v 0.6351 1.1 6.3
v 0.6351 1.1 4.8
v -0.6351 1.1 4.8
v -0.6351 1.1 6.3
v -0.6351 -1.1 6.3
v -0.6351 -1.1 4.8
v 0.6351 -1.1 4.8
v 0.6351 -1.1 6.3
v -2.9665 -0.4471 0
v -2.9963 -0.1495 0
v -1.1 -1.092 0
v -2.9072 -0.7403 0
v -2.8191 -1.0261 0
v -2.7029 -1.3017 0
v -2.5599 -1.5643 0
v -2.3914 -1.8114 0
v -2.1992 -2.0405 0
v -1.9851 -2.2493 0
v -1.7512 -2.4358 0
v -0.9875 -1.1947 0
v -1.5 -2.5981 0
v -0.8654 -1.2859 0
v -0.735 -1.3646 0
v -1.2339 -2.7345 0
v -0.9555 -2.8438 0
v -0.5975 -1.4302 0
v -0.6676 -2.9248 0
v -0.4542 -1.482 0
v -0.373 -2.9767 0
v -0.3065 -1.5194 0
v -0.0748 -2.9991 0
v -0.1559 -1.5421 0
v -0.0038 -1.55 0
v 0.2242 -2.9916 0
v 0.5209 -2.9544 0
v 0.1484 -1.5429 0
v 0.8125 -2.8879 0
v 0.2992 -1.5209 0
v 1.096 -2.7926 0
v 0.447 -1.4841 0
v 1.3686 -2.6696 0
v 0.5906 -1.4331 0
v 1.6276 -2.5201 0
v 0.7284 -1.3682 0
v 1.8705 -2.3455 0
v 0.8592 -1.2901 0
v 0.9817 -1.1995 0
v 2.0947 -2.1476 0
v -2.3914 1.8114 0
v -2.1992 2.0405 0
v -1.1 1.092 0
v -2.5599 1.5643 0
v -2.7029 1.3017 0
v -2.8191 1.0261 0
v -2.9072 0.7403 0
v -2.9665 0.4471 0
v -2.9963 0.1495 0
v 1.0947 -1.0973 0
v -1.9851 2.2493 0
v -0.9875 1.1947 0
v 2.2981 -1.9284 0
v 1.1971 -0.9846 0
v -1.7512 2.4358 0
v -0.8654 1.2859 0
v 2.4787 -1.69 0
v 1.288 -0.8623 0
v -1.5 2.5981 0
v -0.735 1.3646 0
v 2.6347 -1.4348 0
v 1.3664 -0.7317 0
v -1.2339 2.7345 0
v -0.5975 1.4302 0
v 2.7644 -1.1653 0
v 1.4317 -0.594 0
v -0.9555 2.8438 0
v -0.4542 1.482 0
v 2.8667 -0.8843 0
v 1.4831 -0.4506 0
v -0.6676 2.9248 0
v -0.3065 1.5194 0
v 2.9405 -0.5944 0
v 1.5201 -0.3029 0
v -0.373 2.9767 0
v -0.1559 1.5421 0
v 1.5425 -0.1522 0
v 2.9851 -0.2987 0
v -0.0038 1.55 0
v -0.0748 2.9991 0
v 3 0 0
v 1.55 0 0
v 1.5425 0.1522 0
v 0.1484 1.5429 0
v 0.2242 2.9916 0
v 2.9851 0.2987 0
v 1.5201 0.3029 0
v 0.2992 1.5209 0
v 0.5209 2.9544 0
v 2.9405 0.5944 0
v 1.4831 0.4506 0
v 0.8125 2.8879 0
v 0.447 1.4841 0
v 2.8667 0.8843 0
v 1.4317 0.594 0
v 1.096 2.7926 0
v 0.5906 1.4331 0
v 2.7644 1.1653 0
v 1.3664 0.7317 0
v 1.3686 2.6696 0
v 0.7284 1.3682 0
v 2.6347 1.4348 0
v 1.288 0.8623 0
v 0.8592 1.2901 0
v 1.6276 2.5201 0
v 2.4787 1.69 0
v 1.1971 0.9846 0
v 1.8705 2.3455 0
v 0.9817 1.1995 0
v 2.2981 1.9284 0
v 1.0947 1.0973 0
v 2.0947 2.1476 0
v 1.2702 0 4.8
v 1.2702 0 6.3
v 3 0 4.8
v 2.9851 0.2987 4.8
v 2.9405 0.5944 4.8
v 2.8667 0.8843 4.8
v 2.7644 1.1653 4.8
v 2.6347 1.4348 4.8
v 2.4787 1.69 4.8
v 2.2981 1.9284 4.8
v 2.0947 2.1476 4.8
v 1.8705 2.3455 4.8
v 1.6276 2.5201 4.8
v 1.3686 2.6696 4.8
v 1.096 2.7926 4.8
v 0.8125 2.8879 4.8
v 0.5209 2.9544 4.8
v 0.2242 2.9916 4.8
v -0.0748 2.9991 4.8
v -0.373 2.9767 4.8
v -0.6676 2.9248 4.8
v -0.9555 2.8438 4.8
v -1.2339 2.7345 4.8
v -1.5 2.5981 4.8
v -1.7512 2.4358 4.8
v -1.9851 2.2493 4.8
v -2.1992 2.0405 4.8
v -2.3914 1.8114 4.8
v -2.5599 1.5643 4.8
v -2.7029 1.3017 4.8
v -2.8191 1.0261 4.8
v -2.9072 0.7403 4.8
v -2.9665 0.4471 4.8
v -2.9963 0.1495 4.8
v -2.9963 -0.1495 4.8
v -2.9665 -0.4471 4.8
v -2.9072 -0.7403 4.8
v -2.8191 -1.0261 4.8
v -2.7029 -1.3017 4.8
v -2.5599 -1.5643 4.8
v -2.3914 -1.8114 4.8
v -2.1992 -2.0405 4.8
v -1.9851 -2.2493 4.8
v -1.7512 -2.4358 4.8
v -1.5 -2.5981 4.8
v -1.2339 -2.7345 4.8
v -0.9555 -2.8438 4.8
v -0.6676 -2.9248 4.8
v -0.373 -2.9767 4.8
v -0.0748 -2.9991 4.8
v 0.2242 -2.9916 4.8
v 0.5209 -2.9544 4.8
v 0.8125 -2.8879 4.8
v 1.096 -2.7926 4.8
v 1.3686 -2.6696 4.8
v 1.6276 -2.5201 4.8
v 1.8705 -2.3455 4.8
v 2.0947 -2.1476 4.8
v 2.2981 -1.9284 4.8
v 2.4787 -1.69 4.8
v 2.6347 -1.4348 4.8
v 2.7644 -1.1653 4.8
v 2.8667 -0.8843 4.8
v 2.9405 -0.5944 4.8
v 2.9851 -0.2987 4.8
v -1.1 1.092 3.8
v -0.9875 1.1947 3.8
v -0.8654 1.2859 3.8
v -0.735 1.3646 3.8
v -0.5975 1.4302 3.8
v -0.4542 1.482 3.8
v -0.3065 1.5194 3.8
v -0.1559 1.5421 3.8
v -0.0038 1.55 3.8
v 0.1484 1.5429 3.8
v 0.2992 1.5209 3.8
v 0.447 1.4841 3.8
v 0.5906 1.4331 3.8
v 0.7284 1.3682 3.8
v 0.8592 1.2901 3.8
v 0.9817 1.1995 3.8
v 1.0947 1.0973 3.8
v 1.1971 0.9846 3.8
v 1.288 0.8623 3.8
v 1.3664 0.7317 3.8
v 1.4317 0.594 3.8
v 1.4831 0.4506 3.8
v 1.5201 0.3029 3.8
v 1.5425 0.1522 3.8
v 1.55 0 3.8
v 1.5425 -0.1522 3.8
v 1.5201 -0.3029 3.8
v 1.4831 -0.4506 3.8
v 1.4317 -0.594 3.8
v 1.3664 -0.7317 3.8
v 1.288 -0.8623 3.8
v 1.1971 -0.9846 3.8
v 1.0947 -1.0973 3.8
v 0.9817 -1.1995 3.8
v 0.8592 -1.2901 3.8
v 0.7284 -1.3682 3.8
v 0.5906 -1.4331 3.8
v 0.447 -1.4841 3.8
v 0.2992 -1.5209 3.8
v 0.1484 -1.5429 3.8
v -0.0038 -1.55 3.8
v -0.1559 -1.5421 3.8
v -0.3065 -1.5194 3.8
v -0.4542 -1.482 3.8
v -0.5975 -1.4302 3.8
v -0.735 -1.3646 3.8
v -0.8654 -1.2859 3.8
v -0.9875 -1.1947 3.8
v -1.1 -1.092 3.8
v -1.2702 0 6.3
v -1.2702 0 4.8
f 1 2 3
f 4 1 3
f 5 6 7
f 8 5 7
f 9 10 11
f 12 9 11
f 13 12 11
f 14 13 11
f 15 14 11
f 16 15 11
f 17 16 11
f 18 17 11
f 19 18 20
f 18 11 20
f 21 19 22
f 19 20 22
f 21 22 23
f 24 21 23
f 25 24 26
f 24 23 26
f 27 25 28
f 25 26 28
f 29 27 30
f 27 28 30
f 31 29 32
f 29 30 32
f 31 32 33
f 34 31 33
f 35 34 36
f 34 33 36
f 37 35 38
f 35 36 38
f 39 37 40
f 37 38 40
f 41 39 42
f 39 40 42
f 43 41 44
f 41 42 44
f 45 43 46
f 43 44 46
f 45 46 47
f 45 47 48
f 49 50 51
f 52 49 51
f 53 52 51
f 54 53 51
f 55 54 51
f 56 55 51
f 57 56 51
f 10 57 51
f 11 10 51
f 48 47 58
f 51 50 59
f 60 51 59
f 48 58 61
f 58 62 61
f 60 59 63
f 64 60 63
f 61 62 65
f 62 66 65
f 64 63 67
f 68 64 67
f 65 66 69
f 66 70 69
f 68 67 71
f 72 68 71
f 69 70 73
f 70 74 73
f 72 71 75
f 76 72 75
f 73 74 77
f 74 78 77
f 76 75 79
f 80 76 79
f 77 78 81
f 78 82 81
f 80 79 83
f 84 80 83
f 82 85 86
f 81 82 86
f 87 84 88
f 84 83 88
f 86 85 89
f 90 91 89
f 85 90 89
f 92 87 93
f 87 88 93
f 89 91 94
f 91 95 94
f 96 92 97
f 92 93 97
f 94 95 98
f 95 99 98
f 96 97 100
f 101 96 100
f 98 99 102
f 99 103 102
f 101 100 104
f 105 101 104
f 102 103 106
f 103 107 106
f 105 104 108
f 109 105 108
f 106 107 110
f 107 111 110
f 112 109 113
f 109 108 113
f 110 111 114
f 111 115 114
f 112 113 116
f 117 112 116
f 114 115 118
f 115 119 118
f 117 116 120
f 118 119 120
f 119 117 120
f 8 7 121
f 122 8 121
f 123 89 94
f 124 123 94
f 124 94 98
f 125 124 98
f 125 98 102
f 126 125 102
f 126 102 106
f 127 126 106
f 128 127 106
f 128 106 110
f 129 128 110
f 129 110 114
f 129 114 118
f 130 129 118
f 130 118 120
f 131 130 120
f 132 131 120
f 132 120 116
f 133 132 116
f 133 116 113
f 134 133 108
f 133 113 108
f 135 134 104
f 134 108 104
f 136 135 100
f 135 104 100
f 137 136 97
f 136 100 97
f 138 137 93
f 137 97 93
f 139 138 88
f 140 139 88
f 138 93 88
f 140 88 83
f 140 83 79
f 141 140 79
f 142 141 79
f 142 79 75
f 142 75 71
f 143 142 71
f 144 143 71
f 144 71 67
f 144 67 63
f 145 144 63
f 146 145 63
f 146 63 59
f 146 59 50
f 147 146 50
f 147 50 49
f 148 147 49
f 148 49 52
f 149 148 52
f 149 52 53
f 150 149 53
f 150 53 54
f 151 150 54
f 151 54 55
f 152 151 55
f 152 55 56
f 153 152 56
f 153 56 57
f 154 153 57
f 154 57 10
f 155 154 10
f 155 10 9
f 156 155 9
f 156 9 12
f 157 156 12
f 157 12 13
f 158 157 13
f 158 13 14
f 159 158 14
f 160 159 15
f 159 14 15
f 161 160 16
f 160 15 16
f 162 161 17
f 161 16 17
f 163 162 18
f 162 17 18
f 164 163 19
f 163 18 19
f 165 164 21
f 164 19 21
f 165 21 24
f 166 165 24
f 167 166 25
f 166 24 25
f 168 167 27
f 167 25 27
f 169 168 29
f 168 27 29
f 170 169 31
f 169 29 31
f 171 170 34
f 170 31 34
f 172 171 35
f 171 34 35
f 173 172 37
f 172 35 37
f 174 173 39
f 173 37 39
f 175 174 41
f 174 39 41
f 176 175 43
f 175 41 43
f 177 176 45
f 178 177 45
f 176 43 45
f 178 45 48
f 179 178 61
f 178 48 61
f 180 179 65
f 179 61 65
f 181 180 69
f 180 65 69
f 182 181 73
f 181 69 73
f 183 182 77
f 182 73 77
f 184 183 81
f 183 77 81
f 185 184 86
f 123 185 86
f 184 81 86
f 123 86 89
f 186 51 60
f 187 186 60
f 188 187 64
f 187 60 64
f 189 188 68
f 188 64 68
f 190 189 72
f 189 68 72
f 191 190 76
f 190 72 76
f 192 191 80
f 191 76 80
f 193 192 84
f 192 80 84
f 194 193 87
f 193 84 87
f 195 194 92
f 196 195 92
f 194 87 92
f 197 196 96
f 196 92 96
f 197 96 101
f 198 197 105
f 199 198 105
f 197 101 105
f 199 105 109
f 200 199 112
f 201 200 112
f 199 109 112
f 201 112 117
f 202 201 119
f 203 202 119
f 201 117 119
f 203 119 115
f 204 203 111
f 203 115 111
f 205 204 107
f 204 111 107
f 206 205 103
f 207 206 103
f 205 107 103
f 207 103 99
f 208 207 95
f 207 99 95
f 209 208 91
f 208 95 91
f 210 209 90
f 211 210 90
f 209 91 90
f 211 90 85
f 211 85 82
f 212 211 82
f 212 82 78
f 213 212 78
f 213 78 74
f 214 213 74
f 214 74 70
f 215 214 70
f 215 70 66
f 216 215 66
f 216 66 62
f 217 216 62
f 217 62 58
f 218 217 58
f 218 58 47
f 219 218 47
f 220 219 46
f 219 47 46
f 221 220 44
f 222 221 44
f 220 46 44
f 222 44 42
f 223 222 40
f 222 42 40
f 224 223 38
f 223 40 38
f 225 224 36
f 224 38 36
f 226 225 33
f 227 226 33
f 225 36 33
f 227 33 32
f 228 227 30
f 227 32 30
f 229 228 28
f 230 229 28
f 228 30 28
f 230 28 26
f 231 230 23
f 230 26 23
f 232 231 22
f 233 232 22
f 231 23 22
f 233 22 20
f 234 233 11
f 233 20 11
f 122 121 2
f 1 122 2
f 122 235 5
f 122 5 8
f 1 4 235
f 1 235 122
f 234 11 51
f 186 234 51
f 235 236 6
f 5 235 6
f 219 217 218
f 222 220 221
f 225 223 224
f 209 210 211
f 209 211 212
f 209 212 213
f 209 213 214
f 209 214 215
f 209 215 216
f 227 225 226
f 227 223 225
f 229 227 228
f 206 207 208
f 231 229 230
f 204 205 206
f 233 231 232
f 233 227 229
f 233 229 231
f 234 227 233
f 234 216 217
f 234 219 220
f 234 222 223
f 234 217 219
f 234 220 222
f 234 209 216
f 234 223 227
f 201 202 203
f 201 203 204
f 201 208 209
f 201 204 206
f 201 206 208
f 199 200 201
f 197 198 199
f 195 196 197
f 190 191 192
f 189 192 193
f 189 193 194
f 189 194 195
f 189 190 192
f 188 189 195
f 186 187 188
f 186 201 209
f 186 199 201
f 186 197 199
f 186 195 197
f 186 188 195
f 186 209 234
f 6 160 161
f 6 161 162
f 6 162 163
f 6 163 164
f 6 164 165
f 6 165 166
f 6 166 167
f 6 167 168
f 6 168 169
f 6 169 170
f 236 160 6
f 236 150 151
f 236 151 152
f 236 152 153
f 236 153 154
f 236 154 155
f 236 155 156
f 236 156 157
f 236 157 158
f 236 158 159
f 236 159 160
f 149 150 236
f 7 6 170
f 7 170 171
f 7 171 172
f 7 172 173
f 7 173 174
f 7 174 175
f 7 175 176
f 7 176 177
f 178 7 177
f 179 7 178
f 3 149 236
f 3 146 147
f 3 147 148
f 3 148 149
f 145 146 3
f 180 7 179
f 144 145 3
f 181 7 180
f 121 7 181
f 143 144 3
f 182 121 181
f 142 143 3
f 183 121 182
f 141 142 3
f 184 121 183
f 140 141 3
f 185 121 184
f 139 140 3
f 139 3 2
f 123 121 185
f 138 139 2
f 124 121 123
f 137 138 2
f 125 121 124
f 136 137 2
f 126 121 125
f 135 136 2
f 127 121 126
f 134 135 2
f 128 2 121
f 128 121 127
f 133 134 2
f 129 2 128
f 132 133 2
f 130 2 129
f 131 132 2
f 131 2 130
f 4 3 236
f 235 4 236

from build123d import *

# Parameters (mm, degrees)
SKETCH_1_R               = 3
SKETCH_1_R_2             = 1.65
EXTRUDE_1_DEPTH          = 4
CUT_EXTRUDE_2_DEPTH      = 6.830951895
PATTERN_CIRCULAR_1_COUNT = 9
SKETCH_2_R               = 3
EXTRUDE_2_DEPTH          = 0.8
EXTRUDE_START            = 0.8
EXTRUDE_3_DEPTH          = 1.5
EXTRUDE_START_2          = -4
SKETCH_2_4_R             = 3
EXTRUDE_4_DEPTH          = 4
CUT_EXTRUDE_3_DEPTH      = 3.8


with BuildPart() as part:
    # 草图1 → 凸台-拉伸1 (new body)
    with BuildSketch(Plane.XY):
        Circle(SKETCH_1_R)
        Circle(SKETCH_1_R_2, mode=Mode.SUBTRACT)
    extrude(amount=EXTRUDE_1_DEPTH)

    # 草图1<3> → 切除-拉伸2 (cut, through all)
    with BuildSketch(Plane.XY):
        with BuildLine():
            Line((1.583201231, 0.595370355), (1.54440693, 0.580781573))
            ThreePointArc((1.54440693, 0.580781573), (1.623387112, 0.295151288), (1.65, 0))
            ThreePointArc((1.65, 0), (1.623387112, -0.295151288), (1.54440693, -0.580781573))
            Line((1.54440693, -0.580781573), (1.583201231, -0.595370355))
            add(Edge.make_bspline(
                [(1.583201231, -0.595370355), (1.595268082, -0.599908151), (1.629927649, -0.609960022), (1.698544644, -0.618780808), (1.810680065, -0.617601716), (1.954246735, -0.59352555), (2.132298369, -0.536822163), (2.302941373, -0.452472776), (2.42578745, -0.372108406), (2.505673341, -0.310927028), (2.533645284, -0.288342805)],
                knots=[0, 0, 0, 0, 0, 0.005604068, 0.015718248, 0.029959916, 0.048733667, 0.068727063, 0.096888892, 0.112551479, 0.112551479, 0.112551479, 0.112551479, 0.112551479], degree=4))
            ThreePointArc((2.533645284, -0.288342805), (2.545908038, -0.144403125), (2.55, 0))
            ThreePointArc((2.55, 0), (2.545908038, 0.144403125), (2.533645284, 0.288342805))
            add(Edge.make_bspline(
                [(1.583201231, 0.595370355), (1.595268082, 0.599908151), (1.629927649, 0.609960022), (1.698544644, 0.618780808), (1.810680065, 0.617601716), (1.954246735, 0.59352555), (2.132298369, 0.536822163), (2.302941373, 0.452472776), (2.42578745, 0.372108406), (2.505673341, 0.310927028), (2.533645284, 0.288342805)],
                knots=[0, 0, 0, 0, 0, 0.005604068, 0.015718248, 0.029959916, 0.048733667, 0.068727063, 0.096888892, 0.112551479, 0.112551479, 0.112551479, 0.112551479, 0.112551479], degree=4))
        make_face()
    cut_extrude_2 = extrude(amount=CUT_EXTRUDE_2_DEPTH, mode=Mode.SUBTRACT)

    # 阵列(圆周)1: 切除-拉伸2 ×9 about axis
    pattern_circular_1_axis = Axis((0, 0, 4), (0, 0, 1))
    for i in range(1, PATTERN_CIRCULAR_1_COUNT):
        add(cut_extrude_2.rotate(pattern_circular_1_axis, i * 360 / PATTERN_CIRCULAR_1_COUNT), mode=Mode.SUBTRACT)

    # 草图2 → 凸台-拉伸2 (add)
    with BuildSketch(Plane.XY.offset(4)):
        Circle(SKETCH_2_R)
    extrude(amount=EXTRUDE_2_DEPTH)

    # 草图2<3> → 凸台-拉伸3 (add)
    with BuildSketch(Plane.XY.offset(4).offset(EXTRUDE_START)):
        Polygon((0.635085296, 1.1), (-0.635085296, 1.1), (-1.270170592, 0), (-0.635085296, -1.1), (0.635085296, -1.1), (1.270170592, 0), align=None)
    extrude(amount=EXTRUDE_3_DEPTH)

    # 草图2<4> → 凸台-拉伸4 (add)
    with BuildSketch(Plane.XY.offset(4).offset(EXTRUDE_START_2)):
        Circle(SKETCH_2_4_R)
    extrude(amount=EXTRUDE_4_DEPTH)

    # 草图3 → 切除-拉伸3 (cut)
    with BuildSketch(Plane(origin=(0, 0, 0), x_dir=(-1, 0, 0), z_dir=(0, 0, -1))):
        with BuildLine():
            Line((1.1, -1.092016483), (1.1, 1.092016483))
            ThreePointArc((1.1, 1.092016483), (-1.55, 0), (1.1, -1.092016483))
        make_face()
    extrude(amount=-CUT_EXTRUDE_3_DEPTH, mode=Mode.SUBTRACT)


solid = part.part
